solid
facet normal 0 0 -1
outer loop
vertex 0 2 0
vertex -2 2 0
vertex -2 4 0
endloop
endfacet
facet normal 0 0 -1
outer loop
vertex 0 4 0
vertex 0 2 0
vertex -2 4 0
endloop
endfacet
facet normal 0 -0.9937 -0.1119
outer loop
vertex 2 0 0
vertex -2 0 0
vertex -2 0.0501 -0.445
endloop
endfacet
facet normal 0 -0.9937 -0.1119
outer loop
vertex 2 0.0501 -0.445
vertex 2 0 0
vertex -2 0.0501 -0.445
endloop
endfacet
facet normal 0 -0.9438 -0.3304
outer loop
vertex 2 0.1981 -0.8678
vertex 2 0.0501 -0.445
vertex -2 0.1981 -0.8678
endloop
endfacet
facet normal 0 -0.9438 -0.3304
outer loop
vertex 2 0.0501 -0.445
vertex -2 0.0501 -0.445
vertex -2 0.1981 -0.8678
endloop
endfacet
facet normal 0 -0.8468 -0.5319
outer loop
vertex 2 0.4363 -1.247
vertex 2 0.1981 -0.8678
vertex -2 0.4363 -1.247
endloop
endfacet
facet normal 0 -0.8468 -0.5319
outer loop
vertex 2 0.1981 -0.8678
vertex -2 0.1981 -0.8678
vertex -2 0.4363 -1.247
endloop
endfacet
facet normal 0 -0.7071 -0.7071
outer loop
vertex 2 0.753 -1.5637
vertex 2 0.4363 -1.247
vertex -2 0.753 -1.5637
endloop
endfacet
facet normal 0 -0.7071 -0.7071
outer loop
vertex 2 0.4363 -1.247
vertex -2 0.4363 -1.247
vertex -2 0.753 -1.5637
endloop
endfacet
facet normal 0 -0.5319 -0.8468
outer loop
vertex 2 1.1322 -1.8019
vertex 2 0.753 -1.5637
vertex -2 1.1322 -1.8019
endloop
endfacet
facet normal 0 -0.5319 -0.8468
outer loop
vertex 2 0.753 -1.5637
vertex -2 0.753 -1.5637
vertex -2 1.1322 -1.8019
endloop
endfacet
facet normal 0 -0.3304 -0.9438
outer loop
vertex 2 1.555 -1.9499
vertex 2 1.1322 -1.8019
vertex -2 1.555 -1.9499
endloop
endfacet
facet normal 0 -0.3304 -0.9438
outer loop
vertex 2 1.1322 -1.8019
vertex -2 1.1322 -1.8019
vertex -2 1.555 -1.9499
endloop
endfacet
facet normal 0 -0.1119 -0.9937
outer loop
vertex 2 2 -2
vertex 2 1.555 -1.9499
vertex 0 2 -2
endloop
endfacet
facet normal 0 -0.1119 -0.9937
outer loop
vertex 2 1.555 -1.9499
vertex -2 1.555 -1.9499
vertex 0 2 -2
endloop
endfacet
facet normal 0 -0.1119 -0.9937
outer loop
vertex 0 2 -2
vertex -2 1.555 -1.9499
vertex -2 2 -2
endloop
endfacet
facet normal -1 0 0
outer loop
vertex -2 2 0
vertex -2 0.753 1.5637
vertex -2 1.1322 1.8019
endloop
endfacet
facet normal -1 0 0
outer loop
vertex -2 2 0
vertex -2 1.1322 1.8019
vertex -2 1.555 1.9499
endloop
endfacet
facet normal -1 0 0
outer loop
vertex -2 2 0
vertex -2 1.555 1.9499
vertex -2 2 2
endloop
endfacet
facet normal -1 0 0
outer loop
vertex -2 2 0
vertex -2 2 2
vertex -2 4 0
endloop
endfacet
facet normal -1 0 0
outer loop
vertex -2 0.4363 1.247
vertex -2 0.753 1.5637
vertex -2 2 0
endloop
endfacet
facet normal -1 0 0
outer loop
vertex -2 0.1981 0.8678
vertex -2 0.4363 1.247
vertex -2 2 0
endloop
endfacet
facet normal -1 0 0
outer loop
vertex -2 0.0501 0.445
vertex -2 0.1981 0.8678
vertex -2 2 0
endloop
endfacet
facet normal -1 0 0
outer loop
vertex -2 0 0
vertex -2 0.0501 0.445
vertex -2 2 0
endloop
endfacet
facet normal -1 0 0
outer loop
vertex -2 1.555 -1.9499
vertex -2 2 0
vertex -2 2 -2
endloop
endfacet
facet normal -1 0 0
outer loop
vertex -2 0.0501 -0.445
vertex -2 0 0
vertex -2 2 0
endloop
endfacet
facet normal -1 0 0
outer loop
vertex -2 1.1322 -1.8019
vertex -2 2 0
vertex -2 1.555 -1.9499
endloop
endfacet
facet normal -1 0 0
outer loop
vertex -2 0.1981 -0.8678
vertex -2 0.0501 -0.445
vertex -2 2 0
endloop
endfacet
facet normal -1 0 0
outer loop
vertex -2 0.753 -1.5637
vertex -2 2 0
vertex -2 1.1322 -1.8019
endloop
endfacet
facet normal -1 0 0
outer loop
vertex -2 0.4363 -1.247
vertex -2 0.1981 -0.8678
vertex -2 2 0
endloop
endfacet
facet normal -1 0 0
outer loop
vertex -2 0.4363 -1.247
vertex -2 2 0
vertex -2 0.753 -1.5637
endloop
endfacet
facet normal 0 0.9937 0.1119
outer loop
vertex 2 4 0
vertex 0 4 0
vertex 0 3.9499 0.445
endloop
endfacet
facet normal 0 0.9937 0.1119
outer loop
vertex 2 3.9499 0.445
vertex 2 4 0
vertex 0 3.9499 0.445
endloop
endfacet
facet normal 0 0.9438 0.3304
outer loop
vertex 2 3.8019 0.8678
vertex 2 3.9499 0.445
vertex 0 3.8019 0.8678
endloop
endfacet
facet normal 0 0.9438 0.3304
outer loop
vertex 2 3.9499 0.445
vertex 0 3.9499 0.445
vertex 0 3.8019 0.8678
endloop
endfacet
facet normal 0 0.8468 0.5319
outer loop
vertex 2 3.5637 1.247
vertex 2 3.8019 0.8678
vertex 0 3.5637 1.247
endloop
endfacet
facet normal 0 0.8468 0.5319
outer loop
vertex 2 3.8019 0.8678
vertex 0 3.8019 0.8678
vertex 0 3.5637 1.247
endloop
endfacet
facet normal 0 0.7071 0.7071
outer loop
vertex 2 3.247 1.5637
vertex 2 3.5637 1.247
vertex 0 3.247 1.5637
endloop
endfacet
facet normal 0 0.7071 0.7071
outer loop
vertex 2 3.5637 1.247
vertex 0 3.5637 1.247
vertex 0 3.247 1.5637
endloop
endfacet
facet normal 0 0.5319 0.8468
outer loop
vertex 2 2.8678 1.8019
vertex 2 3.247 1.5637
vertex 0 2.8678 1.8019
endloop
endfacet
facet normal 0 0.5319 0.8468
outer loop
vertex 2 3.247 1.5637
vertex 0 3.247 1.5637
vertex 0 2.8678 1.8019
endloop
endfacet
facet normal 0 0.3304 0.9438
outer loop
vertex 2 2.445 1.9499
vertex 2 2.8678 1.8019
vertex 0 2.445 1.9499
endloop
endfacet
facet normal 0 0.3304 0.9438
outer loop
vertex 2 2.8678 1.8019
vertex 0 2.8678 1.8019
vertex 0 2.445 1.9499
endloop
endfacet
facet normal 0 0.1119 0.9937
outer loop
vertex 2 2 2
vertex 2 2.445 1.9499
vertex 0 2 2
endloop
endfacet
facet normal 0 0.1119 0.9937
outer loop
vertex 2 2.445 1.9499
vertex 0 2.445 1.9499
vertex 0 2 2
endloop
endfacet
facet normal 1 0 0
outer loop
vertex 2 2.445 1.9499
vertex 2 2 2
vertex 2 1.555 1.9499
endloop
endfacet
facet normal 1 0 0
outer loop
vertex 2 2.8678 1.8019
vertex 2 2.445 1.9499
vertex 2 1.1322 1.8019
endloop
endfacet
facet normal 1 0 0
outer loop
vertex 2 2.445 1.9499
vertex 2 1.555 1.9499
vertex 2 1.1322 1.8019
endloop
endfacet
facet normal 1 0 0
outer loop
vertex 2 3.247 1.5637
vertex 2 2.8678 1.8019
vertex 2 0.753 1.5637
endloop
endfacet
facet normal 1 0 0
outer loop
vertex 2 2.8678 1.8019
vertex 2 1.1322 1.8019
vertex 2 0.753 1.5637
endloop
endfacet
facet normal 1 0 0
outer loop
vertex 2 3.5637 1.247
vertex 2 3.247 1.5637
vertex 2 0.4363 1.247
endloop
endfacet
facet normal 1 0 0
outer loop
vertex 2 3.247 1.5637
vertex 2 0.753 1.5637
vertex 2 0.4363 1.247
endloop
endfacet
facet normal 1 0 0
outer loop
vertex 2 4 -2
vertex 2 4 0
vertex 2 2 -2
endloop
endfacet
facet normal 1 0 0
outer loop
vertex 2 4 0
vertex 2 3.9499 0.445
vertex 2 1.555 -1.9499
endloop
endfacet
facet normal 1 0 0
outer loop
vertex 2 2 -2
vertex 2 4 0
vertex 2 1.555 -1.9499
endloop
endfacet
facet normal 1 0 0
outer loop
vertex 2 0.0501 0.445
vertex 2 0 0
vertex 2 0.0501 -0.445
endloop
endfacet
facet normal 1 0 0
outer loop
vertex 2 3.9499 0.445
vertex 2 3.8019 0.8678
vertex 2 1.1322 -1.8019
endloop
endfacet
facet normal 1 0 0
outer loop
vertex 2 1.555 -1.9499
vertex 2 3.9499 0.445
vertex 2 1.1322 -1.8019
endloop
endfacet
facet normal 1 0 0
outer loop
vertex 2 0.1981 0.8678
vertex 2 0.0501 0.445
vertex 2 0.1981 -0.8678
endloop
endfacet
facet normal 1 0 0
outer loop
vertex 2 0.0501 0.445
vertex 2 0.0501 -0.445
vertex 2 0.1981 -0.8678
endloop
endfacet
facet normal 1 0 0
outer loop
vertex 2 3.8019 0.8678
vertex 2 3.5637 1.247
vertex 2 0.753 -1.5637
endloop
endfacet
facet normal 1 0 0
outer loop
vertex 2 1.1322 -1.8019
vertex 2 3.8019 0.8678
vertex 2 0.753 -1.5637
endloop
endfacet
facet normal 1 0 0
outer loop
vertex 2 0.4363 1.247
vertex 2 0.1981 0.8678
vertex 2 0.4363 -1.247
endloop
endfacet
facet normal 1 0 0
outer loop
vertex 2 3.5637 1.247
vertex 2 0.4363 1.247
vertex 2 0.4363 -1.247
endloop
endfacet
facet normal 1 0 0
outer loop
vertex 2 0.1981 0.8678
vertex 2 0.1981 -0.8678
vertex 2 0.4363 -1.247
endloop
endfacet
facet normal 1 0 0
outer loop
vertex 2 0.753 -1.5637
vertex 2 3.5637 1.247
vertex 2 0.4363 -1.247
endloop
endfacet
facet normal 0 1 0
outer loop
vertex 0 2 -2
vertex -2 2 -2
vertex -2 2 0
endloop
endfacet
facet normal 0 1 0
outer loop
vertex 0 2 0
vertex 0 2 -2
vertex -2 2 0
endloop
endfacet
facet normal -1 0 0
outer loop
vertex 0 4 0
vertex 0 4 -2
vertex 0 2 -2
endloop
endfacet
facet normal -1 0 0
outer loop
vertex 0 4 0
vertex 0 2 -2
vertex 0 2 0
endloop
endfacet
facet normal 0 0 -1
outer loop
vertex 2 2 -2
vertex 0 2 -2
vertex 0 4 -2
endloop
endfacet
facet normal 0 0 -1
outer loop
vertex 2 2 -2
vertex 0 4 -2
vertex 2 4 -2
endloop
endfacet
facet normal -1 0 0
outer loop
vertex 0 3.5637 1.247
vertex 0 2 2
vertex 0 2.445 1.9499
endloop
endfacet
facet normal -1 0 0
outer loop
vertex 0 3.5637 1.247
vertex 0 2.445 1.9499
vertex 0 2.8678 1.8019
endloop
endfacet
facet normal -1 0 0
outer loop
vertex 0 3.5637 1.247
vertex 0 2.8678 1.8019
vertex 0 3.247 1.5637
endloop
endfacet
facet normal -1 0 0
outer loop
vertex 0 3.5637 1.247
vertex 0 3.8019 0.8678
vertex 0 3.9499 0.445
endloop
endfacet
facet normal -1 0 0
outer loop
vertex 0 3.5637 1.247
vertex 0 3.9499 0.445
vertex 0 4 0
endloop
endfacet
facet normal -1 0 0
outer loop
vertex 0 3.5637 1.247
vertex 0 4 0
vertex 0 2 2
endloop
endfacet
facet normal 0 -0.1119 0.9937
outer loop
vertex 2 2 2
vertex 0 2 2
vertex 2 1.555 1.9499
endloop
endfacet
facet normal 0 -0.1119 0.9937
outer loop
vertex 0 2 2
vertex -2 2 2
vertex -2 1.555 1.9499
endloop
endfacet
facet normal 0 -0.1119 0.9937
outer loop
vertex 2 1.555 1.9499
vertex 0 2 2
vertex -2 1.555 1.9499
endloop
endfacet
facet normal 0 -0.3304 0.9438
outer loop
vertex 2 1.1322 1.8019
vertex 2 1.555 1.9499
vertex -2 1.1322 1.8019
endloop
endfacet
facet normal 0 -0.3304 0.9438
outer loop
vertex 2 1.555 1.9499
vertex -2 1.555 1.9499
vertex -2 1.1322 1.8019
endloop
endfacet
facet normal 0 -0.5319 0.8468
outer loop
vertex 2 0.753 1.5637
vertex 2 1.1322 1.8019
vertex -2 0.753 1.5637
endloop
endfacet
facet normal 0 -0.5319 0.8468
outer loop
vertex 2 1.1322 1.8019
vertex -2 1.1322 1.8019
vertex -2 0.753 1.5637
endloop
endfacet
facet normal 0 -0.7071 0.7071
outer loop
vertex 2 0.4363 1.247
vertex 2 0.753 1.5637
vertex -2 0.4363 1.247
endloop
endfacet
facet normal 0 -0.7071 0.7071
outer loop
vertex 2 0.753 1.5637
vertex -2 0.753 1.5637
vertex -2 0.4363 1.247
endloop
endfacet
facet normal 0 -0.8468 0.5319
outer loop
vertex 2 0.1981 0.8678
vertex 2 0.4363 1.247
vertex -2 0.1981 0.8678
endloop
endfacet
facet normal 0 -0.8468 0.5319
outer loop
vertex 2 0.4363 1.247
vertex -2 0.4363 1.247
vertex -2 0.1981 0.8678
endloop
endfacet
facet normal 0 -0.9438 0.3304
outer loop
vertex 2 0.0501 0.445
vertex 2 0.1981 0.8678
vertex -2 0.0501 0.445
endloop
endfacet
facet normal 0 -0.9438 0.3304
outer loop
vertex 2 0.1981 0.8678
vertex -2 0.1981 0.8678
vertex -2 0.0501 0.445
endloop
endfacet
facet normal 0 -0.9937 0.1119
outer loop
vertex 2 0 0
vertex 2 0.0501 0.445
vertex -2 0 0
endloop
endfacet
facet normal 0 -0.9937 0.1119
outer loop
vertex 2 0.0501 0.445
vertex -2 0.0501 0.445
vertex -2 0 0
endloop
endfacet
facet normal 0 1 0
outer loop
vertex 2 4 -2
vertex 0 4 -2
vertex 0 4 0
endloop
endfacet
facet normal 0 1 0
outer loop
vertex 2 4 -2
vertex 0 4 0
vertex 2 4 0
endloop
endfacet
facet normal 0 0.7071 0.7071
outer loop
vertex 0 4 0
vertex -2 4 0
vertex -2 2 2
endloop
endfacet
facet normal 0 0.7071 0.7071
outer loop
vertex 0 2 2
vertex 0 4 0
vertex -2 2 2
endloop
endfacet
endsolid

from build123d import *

# Parameters (mm, degrees)
SKETCH1_W           = 4
SKETCH1_H           = 4
BOSS_EXTRUDE1_DEPTH = 4
SKETCH2_W           = 2
SKETCH2_H           = 2
CUT_EXTRUDE1_DEPTH  = 2
CUT_EXTRUDE2_DEPTH  = 20


with BuildPart() as part:
    # Sketch1 → Boss-Extrude1 (new body)
    with BuildSketch(Plane(origin=(0, 0, 0), x_dir=(1, 0, 0), z_dir=(0, 1, 0))):
        Rectangle(SKETCH1_W, SKETCH1_H)
    extrude(amount=BOSS_EXTRUDE1_DEPTH)

    # Sketch2 → Cut-Extrude1 (cut)
    with BuildSketch(Plane.ZY.offset(2)):
        Polygon((0, 4), (2, 2), (2, 4), align=None)
        with Locations((-1, 3)):
            Rectangle(SKETCH2_W, SKETCH2_H)
    extrude(amount=-CUT_EXTRUDE1_DEPTH, mode=Mode.SUBTRACT)

    # Sketch3 → Cut-Extrude2 (cut, symmetric)
    with BuildSketch(Plane.ZY):
        with BuildLine():
            Line((2, 4), (0, 4))
            ThreePointArc((0, 4), (1.414213562, 3.414213562), (2, 2))
            Line((2, 2), (2, 4))
        make_face()
        with BuildLine():
            Line((2, 0), (2, 2))
            ThreePointArc((2, 2), (1.414213562, 0.585786438), (0, 0))
            Line((0, 0), (2, 0))
        make_face()
        with BuildLine():
            Line((-2, 0), (0, 0))
            ThreePointArc((0, 0), (-1.414213562, 0.585786438), (-2, 2))
            Line((-2, 2), (-2, 0))
        make_face()
    extrude(amount=CUT_EXTRUDE2_DEPTH, both=True, mode=Mode.SUBTRACT)


solid = part.part
